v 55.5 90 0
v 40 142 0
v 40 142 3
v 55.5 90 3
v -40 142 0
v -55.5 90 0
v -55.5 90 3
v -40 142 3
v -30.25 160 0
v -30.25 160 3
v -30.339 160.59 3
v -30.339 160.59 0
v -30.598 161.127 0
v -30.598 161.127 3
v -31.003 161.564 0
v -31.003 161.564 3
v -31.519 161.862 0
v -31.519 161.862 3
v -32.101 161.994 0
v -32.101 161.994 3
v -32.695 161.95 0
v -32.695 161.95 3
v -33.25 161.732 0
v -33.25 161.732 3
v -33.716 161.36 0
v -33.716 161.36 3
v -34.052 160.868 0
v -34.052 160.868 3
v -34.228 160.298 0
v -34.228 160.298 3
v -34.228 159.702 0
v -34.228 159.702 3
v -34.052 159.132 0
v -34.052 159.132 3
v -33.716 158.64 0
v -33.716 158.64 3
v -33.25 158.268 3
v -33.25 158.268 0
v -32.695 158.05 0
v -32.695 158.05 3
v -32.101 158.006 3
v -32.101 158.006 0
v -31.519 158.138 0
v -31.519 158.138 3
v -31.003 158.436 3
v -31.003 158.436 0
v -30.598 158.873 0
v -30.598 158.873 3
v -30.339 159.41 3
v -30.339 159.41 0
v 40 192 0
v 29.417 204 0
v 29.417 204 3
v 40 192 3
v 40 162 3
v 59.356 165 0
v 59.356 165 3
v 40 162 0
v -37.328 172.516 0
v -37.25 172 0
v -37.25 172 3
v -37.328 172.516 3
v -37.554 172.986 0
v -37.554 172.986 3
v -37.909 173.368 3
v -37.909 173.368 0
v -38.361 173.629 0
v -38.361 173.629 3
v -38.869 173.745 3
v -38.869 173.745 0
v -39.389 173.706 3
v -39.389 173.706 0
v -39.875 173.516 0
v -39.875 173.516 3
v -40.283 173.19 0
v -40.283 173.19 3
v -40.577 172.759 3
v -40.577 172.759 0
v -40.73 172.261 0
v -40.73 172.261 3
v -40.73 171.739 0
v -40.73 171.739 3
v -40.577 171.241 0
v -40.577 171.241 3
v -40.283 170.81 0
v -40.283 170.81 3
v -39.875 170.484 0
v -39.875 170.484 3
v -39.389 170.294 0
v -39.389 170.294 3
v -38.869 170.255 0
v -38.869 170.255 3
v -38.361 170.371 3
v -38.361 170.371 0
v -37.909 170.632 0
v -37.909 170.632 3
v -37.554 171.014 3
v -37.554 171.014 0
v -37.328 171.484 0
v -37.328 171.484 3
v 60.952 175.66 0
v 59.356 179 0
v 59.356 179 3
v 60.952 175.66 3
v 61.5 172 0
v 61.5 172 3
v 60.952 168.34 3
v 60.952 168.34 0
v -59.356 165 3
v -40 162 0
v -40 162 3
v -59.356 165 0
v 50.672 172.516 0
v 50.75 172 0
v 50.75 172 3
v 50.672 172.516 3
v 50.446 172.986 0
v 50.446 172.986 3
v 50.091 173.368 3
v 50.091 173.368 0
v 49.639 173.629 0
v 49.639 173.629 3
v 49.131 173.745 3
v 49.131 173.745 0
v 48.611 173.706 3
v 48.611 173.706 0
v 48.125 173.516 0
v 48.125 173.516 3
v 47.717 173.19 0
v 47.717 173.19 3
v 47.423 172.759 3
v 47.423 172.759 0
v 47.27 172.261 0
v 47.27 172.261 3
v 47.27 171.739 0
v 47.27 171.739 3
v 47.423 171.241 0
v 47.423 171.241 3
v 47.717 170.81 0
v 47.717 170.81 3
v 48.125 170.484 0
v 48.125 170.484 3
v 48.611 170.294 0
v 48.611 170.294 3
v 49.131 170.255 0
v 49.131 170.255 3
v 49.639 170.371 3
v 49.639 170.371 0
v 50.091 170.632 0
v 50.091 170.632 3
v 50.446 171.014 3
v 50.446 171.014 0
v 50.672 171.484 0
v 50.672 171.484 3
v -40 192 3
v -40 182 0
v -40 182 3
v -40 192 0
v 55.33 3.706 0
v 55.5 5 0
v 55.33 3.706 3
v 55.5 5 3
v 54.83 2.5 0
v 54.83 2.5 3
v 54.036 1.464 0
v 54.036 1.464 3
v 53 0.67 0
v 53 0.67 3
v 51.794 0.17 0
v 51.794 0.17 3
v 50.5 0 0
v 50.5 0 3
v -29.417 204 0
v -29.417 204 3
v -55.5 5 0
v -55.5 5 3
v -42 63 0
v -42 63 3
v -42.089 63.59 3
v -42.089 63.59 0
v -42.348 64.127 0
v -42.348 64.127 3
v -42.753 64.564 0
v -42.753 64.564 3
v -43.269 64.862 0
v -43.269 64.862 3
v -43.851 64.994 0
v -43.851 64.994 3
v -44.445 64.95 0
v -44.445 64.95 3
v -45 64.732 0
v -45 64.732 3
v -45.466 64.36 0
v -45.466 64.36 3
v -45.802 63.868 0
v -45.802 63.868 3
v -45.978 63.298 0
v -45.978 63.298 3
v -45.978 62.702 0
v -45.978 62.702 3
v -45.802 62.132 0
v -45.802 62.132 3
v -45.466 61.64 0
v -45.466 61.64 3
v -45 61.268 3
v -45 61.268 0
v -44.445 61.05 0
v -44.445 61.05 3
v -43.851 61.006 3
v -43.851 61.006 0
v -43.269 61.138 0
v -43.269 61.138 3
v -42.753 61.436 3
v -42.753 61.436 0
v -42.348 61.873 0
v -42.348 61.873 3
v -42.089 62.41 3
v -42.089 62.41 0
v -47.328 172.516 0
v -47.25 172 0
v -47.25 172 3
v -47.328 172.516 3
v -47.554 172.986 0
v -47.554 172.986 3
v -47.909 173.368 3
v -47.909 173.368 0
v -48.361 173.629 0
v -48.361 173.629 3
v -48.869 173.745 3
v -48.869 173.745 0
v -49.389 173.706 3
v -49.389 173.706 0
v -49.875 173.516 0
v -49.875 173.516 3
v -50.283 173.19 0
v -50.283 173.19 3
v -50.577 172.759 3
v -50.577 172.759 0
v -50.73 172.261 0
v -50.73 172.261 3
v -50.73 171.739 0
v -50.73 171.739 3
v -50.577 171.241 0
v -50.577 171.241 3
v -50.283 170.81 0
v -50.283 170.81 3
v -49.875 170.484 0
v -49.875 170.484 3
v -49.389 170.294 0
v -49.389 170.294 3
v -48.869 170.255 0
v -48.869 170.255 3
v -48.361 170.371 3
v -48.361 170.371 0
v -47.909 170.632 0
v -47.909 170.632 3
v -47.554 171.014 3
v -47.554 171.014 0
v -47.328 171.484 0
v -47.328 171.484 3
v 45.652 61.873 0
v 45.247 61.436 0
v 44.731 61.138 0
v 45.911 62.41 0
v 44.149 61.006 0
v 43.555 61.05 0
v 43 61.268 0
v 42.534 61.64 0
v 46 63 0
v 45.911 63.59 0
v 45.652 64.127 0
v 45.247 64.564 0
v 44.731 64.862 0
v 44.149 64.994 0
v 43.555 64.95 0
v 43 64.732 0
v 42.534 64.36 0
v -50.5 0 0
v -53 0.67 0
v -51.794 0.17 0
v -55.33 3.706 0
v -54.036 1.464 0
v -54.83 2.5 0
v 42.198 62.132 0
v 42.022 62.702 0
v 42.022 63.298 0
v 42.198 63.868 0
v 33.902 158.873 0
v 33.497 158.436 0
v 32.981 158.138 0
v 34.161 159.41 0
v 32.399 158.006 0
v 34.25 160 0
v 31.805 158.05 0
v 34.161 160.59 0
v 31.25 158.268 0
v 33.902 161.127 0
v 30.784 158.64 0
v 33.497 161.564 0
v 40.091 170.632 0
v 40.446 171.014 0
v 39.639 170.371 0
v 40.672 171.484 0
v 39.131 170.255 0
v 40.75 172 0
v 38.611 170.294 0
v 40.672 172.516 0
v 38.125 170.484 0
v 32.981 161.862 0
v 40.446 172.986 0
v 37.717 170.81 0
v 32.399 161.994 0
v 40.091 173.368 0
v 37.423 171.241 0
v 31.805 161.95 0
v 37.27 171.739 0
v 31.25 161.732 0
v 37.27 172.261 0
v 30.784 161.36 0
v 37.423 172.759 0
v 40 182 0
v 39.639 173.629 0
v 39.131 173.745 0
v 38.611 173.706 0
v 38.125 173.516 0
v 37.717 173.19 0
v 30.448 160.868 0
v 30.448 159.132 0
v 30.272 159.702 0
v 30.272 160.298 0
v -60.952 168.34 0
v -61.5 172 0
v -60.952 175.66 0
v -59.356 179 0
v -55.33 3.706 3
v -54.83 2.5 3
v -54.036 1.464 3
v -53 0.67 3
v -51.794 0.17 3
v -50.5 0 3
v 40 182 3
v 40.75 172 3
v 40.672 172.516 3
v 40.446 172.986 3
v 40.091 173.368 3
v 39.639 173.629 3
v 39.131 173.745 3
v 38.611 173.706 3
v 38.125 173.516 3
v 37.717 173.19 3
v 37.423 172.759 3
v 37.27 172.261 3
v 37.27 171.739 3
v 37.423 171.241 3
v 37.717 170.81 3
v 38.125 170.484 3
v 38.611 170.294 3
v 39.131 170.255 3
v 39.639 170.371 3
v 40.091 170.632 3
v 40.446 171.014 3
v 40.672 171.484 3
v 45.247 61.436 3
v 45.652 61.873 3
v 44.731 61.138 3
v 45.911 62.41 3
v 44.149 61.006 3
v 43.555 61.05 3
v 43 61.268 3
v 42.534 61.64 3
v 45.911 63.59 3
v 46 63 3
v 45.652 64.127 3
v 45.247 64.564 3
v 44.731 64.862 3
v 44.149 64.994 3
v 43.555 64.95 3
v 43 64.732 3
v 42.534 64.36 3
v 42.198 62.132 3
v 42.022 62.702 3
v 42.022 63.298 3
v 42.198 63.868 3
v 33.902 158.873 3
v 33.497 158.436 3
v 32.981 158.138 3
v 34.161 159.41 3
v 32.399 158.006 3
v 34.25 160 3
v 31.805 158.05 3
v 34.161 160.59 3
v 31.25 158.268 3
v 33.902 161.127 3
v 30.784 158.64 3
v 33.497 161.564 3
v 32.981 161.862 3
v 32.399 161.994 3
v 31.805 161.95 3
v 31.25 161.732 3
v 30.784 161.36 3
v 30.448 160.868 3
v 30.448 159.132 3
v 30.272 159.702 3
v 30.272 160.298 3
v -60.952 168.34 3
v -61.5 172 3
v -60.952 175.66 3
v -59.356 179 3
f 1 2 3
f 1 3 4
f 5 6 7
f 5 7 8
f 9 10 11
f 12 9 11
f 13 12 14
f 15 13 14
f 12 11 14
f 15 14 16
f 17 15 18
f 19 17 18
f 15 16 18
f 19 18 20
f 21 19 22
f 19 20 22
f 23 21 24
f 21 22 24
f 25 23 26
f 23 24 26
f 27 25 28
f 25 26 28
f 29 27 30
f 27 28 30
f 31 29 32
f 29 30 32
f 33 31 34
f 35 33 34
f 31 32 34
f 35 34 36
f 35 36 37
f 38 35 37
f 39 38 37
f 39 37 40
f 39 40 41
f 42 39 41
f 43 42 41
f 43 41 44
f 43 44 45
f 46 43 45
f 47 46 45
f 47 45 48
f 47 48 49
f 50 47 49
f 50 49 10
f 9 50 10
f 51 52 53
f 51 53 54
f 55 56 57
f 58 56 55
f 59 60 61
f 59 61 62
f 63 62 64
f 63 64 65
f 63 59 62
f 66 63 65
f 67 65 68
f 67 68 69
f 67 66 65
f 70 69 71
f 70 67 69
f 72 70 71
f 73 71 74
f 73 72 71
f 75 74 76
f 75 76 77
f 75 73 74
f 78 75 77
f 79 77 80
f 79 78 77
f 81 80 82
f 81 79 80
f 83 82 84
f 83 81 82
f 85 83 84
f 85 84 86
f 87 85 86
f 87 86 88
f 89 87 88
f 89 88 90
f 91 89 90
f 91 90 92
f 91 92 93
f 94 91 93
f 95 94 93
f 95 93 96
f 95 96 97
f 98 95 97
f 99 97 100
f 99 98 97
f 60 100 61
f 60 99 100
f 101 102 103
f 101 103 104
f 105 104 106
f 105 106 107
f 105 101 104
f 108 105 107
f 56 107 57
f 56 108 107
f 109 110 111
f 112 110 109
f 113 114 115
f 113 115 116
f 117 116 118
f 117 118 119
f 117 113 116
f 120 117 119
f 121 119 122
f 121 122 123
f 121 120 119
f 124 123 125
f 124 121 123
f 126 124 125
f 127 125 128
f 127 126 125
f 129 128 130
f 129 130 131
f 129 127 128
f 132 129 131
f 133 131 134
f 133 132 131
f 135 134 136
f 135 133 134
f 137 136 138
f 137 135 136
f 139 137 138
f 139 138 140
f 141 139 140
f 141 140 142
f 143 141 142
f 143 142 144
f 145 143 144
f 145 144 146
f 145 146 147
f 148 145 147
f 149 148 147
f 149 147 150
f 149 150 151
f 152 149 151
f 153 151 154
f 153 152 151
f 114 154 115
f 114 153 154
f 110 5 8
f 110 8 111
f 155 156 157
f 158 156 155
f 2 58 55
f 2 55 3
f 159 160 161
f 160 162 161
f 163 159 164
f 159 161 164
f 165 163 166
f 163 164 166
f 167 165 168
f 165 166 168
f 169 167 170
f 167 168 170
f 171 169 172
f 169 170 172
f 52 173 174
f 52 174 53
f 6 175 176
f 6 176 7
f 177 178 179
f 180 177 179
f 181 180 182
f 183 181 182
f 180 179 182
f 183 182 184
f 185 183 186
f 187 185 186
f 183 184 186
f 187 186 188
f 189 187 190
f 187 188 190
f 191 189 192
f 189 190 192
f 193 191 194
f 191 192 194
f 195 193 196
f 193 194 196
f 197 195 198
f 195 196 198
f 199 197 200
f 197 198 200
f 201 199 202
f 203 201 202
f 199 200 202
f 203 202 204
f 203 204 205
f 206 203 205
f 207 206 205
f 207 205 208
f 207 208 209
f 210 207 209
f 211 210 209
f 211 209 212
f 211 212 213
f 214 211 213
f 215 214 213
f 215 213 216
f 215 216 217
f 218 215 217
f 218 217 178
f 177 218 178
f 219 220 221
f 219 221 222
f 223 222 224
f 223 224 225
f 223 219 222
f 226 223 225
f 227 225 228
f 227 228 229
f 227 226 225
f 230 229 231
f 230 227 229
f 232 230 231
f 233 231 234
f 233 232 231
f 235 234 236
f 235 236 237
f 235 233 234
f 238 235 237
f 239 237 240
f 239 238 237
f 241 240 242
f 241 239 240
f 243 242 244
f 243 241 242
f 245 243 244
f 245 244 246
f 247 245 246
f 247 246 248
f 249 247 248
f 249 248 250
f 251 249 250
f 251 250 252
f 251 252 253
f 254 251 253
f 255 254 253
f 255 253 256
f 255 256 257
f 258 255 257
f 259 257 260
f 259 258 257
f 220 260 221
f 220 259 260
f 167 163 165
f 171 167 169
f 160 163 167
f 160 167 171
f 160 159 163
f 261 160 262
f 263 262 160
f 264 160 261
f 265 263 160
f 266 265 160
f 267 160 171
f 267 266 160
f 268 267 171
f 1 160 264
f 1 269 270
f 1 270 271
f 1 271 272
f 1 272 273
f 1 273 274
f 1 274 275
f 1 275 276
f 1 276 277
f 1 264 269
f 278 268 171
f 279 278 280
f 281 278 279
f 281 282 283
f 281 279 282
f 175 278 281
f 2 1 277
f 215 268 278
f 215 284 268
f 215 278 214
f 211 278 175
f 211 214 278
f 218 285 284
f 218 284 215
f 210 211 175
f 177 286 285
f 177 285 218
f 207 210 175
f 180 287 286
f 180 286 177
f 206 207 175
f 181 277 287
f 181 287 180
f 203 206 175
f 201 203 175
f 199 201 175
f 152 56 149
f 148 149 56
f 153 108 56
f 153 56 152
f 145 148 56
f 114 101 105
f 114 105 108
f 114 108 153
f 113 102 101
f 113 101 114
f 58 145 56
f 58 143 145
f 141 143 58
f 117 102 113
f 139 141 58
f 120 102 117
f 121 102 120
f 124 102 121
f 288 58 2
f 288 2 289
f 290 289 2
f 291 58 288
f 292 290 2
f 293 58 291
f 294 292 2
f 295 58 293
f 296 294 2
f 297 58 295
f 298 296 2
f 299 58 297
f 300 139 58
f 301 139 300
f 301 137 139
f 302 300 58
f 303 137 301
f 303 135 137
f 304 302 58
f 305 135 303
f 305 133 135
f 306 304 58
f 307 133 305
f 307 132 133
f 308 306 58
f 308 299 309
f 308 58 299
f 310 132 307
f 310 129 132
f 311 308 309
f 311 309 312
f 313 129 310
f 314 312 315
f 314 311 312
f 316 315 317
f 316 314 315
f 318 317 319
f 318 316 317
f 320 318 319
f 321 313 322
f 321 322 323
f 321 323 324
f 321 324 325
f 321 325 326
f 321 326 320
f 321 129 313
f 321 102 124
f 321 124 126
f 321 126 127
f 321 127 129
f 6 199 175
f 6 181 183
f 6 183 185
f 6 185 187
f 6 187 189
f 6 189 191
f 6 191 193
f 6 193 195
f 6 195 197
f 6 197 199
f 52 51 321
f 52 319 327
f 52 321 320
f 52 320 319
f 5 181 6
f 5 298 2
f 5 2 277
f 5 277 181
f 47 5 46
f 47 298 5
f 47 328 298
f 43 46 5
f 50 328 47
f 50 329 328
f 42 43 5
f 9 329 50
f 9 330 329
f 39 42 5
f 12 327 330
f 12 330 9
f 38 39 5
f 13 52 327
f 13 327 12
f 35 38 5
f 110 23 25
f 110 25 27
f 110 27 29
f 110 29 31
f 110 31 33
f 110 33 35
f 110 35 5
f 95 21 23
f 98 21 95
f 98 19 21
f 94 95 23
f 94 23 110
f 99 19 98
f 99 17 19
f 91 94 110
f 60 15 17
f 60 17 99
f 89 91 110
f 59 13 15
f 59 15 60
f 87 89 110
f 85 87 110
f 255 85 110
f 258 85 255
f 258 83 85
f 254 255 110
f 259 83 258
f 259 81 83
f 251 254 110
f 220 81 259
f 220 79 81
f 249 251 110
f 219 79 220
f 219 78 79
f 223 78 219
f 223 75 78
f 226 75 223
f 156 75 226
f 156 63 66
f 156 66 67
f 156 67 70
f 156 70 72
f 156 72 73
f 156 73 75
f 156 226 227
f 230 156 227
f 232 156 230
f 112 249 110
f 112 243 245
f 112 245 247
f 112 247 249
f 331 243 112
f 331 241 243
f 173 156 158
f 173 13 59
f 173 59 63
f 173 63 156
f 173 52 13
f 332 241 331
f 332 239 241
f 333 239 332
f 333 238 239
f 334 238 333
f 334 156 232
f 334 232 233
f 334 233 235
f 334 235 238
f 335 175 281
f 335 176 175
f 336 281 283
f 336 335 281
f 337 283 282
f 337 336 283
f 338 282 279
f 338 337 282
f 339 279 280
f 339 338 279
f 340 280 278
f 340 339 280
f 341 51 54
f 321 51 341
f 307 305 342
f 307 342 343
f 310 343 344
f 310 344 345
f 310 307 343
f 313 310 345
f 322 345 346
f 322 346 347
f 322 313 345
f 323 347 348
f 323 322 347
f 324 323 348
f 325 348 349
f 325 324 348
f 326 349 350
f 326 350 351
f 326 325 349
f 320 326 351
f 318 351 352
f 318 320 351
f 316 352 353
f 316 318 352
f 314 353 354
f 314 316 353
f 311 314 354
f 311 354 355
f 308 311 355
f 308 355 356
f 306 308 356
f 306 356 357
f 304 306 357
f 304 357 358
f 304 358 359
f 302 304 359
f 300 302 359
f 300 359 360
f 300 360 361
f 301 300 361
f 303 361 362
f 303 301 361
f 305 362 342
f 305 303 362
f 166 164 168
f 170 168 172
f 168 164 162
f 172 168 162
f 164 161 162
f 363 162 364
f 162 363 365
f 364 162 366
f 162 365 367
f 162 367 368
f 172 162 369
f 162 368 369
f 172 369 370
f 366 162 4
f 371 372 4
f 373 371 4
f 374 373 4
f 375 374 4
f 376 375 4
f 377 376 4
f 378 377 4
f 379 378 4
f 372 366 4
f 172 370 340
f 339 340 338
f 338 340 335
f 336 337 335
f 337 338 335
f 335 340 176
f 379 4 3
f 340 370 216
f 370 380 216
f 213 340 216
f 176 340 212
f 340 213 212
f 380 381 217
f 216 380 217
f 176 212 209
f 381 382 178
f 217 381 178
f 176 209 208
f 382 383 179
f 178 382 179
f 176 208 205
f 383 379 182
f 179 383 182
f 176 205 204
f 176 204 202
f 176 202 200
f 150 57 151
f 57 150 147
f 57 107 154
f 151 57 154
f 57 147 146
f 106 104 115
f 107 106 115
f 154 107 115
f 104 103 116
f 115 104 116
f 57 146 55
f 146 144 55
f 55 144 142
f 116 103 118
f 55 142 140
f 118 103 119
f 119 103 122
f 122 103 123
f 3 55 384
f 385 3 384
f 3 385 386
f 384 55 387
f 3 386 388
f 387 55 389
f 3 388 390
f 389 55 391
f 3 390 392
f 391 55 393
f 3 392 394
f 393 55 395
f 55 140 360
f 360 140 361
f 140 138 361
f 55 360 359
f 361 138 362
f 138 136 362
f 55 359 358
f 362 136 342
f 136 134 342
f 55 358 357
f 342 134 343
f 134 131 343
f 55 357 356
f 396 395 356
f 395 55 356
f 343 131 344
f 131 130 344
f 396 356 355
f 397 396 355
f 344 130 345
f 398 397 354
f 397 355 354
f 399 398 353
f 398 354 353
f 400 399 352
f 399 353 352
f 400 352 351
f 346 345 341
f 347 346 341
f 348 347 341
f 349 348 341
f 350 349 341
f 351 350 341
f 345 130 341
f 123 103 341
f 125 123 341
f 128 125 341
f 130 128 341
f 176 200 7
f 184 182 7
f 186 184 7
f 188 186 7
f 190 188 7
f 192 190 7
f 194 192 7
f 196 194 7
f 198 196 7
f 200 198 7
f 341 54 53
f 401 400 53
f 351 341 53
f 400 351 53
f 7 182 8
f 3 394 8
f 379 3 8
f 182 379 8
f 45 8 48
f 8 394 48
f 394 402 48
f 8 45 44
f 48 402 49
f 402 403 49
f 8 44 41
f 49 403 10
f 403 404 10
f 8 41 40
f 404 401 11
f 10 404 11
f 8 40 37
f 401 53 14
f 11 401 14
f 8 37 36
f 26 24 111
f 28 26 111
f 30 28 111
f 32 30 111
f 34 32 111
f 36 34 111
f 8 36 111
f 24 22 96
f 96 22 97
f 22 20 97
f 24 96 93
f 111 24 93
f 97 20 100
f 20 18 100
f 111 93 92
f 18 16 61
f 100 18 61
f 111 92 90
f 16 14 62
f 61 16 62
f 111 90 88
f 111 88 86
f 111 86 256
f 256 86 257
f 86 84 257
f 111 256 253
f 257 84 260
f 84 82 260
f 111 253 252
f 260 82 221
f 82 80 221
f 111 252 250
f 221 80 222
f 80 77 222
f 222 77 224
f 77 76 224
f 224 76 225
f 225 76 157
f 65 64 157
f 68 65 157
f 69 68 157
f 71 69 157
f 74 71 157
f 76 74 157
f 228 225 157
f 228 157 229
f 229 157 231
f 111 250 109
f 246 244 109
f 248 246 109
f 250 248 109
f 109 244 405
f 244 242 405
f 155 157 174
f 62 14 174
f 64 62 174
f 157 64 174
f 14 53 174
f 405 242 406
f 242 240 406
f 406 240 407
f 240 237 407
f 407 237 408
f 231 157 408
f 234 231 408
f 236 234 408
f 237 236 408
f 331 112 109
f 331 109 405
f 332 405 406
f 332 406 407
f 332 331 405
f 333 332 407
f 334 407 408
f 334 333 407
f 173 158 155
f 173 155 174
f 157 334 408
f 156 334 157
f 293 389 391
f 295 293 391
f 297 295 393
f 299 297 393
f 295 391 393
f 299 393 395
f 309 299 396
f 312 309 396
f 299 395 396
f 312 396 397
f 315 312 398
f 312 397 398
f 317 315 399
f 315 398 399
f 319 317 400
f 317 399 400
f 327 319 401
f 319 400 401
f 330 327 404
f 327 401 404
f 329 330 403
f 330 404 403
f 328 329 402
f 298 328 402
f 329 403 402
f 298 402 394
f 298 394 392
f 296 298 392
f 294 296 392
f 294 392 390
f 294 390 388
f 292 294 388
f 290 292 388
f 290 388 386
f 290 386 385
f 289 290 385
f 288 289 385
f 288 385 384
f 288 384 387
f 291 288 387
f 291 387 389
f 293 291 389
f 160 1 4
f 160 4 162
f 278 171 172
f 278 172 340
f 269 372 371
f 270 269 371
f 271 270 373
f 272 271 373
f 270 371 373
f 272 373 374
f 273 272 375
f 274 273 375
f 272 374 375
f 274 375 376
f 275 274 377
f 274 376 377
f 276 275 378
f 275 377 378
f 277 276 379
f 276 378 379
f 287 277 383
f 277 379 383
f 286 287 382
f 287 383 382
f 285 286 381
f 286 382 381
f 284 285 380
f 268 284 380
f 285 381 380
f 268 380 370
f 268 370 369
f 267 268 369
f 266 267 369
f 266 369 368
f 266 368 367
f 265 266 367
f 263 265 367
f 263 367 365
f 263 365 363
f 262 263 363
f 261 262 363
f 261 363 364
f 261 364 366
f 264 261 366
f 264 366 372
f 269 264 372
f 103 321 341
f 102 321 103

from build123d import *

# Parameters (mm, degrees)
SKETCH_1_R      = 1.75
EXTRUDE_1_DEPTH = 3
FILLET_1_R      = 5
MM_1_D          = 4


with BuildPart() as part:
    # 草图1 → 凸台-拉伸1 (new body)
    with BuildSketch(Plane.XY):
        with BuildLine():
            Line((-29.416994756, 204), (29.416994756, 204))
            Line((29.416994756, 204), (40, 192))
            Line((40, 192), (40, 182))
            Line((40, 182), (59.356157589, 179))
            ThreePointArc((59.356157589, 179), (61.5, 172), (59.356157589, 165))
            Line((59.356157589, 165), (40, 162))
            Line((40, 162), (40, 142))
            Line((40, 142), (55.5, 90))
            Line((55.5, 90), (55.5, 0))
            Line((55.5, 0), (-55.5, 0))
            Line((-55.5, 0), (-55.5, 90))
            Line((-55.5, 90), (-40, 142))
            Line((-40, 142), (-40, 162))
            Line((-40, 162), (-59.356157589, 165))
            ThreePointArc((-59.356157589, 165), (-61.5, 172), (-59.356157589, 179))
            Line((-59.356157589, 179), (-40, 182))
            Line((-40, 182), (-40, 192))
            Line((-40, 192), (-29.416994756, 204))
        make_face()
        with Locations((-49, 172)):
            Circle(SKETCH_1_R, mode=Mode.SUBTRACT)
        with Locations((49, 172)):
            Circle(SKETCH_1_R, mode=Mode.SUBTRACT)
        with Locations((39, 172)):
            Circle(SKETCH_1_R, mode=Mode.SUBTRACT)
        with Locations((-39, 172)):
            Circle(SKETCH_1_R, mode=Mode.SUBTRACT)
    extrude(amount=EXTRUDE_1_DEPTH)

    # 圆角1
    fillet_1_edges = [part.edges().sort_by_distance(p)[0] for p in [
        (55.5, 0, 1.5),
        (-55.5, 0, 1.5),
    ]]
    fillet(fillet_1_edges, radius=FILLET_1_R)

    # 大小mm 暗销孔1 (through all)
    with Locations(Plane(origin=(0, 0, 0), x_dir=(-1, 0, 0), z_dir=(0, 0, -1))):
        with Locations((-32.25, 160), (32.25, 160), (44, 63), (-44, 63)):
            Hole(MM_1_D / 2)


solid = part.part
